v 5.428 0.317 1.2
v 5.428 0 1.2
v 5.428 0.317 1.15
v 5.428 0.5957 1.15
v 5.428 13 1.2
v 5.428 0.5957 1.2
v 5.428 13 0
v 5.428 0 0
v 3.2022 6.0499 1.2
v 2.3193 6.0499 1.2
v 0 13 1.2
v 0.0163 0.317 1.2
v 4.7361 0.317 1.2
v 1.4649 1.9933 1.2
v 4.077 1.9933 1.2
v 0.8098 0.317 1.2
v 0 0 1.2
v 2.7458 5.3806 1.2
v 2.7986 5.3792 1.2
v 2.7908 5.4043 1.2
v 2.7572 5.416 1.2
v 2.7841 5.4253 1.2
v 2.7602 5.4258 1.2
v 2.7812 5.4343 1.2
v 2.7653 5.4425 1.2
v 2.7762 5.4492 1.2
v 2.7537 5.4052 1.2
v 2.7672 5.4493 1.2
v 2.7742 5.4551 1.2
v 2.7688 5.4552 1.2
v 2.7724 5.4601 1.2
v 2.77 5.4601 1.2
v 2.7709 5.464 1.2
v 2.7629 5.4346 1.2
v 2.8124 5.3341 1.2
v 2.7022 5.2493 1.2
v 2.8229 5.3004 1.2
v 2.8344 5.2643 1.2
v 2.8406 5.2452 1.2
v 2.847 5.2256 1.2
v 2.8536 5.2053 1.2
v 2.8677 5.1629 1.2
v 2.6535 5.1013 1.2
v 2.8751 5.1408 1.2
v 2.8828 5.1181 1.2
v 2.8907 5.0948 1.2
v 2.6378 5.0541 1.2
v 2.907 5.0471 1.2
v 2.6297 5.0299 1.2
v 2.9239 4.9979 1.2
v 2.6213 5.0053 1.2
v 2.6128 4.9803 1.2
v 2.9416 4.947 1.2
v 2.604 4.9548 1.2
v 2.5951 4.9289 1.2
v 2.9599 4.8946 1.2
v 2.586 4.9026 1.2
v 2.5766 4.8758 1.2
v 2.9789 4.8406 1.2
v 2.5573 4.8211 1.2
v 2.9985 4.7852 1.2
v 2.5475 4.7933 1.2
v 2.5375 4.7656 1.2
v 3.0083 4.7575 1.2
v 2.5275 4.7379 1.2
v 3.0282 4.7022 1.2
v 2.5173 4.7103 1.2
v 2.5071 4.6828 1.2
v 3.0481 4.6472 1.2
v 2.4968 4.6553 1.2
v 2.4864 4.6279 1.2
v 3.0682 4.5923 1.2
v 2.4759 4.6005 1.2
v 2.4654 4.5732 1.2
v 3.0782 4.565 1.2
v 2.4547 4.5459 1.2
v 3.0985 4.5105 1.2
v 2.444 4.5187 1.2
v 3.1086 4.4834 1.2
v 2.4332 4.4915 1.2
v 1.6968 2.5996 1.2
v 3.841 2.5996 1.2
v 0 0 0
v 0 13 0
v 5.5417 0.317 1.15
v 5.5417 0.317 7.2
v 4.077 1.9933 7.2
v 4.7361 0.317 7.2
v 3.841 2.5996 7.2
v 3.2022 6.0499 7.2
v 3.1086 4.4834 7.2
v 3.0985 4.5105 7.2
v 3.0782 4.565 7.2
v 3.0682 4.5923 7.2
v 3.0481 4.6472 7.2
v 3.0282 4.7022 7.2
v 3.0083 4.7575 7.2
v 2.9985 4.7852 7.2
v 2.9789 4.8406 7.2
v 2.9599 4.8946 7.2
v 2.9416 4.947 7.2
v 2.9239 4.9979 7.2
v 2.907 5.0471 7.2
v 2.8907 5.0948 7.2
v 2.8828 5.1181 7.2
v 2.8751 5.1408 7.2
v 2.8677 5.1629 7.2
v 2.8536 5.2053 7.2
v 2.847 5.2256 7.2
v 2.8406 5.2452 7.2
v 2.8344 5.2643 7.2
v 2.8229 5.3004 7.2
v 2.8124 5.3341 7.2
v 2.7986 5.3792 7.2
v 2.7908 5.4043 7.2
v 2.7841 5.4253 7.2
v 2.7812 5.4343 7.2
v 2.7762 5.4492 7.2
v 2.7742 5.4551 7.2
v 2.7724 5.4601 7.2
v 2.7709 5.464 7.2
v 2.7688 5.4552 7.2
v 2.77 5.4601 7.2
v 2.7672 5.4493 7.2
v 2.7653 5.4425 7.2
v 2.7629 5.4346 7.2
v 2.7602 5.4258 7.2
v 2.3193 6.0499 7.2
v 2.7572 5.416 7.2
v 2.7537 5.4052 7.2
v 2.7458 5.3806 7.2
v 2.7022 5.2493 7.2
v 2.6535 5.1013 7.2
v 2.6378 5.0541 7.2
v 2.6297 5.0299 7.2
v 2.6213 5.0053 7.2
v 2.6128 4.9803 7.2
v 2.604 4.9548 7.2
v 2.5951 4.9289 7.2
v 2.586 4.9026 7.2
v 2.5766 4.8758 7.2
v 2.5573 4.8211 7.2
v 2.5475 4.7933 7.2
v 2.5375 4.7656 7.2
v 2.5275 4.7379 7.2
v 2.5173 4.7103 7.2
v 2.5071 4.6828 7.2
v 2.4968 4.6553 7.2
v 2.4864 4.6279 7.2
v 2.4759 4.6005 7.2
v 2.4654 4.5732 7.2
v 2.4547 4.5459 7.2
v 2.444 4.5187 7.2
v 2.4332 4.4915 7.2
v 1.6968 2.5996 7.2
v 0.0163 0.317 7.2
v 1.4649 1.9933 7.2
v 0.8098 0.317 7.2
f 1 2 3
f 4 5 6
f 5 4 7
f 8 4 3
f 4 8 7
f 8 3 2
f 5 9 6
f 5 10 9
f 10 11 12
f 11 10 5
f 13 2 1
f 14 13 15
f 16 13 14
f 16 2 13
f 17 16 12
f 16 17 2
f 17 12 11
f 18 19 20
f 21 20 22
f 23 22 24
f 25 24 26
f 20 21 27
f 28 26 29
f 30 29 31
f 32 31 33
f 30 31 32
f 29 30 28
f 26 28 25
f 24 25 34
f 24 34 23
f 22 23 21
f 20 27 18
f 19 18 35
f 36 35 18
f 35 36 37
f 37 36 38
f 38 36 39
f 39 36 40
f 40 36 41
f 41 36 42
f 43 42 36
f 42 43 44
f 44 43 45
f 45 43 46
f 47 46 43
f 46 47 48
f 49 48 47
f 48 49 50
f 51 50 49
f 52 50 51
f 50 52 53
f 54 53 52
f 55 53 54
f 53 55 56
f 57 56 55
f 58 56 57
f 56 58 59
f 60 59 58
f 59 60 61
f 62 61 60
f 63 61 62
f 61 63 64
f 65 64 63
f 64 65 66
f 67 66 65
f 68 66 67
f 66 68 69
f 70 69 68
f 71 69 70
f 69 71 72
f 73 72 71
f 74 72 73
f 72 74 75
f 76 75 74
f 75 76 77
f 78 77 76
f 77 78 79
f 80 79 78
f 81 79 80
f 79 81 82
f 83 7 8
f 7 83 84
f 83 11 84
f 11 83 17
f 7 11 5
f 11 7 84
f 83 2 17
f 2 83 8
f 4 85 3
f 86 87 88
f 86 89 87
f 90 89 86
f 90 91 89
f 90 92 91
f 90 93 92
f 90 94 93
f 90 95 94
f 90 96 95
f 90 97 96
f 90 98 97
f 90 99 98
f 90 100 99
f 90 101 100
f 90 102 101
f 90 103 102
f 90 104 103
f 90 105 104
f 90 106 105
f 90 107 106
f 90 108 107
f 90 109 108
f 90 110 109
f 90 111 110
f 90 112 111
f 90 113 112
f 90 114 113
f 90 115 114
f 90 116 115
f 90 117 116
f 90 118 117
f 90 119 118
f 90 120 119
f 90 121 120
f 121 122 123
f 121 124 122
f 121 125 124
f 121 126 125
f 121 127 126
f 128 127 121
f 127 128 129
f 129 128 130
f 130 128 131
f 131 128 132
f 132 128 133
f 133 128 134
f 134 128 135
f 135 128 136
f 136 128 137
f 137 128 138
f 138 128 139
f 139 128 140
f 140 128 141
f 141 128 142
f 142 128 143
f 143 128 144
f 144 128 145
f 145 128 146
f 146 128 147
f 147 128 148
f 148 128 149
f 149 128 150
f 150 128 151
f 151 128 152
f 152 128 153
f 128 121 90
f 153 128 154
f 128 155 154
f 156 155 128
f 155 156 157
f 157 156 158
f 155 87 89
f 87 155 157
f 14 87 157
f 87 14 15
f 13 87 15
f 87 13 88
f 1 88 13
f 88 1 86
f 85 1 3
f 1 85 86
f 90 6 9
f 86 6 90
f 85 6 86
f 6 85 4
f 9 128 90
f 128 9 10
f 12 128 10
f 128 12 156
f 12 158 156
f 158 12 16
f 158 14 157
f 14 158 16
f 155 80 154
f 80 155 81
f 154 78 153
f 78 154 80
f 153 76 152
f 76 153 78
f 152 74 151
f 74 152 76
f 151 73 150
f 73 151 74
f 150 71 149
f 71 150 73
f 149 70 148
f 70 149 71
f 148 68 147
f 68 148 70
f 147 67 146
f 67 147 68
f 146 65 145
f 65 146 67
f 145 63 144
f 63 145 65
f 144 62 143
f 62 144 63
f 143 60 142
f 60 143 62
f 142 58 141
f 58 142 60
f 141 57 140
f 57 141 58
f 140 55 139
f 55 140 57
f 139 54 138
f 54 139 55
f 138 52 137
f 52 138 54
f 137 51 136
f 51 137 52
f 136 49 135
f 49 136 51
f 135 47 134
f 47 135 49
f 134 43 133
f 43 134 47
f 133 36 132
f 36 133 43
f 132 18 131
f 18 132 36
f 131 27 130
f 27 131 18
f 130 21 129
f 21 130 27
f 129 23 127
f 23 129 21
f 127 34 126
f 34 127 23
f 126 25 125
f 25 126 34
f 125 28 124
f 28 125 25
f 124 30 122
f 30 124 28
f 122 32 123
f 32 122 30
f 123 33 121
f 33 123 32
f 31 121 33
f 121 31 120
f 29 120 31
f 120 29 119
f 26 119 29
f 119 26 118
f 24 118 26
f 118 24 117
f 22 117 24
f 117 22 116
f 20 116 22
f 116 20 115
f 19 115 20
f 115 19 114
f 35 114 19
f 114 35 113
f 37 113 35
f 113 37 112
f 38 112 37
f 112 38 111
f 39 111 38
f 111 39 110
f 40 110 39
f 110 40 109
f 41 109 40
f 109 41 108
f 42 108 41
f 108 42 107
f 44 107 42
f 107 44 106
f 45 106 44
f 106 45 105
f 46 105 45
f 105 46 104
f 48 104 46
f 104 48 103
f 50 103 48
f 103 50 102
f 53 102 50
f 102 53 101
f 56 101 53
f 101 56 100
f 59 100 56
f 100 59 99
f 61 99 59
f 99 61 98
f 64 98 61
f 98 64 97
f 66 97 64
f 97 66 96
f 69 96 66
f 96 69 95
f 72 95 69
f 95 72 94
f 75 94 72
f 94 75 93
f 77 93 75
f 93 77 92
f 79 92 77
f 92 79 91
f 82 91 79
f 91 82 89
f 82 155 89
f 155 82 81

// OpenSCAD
// letter_block.scad — 单字母印章块（活字字粒）
//
// 设计目标：与 stampgen 整块方案「逐字母复刻」，块宽严格等于字体 advance，
// 拼装后每一对相邻字母的墨迹间隙与整块方案完全一致。
//
// 坐标约定（与 stampgen 一致）：
//   X = 块宽（= advance，逐字母不同），Y = 块深（印章进深），Z = 底板厚度 + 字高
//   块占 [0, block_width] × [0, block_depth] × [0, plate_thickness]
//
// 镜像策略（关键）：
//   只镜像「字形」，不镜像「块」。若整块镜像，字母在块内的左右留白会互换，
//   块宽 = advance 时字距就会错。这里做法是：字形绕 x=0 翻转后，再平移
//   (ink_xmin + ink_xmax)，使其墨迹仍落在 [ink_xmin, ink_xmax]。
//   结果：字形是反的（印章需要），但占位与整块方案完全相同。
//
// 基线策略（关键）：
//   所有字母共用一条基线（baseline_y），以「大写字高 cap 的中心」对齐块深中心。
//   不能按每个字母自己的墨迹包围盒居中 —— O/S/C 有 overshoot、Q 有尾巴，
//   各自居中会导致拼起来高低不齐。

letter          = "A";
block_width     = 5.428;
block_depth     = 13.0;
plate_thickness = 1.2;
letter_height   = 6.0;
letter_size     = 6.0;
ink_xmin        = -0.012;
ink_xmax        = 5.570;
baseline_y      = 0.317;
font_family     = "Arial";
font_style      = "Regular";
overlap         = 0.05;

$fa = 4;
$fs = 0.3;

module glyph2d() {
    translate([ink_xmin + ink_xmax, 0, 0])
        mirror([1, 0, 0])
            translate([0, baseline_y, 0])
                text(letter,
                     size   = letter_size,
                     font   = str(font_family, ":style=", font_style),
                     halign = "left",
                     valign = "baseline");
}

module block() {
    cube([block_width, block_depth, plate_thickness]);
    translate([0, 0, plate_thickness - overlap])
        linear_extrude(height = letter_height + overlap)
            glyph2d();
}

block();
